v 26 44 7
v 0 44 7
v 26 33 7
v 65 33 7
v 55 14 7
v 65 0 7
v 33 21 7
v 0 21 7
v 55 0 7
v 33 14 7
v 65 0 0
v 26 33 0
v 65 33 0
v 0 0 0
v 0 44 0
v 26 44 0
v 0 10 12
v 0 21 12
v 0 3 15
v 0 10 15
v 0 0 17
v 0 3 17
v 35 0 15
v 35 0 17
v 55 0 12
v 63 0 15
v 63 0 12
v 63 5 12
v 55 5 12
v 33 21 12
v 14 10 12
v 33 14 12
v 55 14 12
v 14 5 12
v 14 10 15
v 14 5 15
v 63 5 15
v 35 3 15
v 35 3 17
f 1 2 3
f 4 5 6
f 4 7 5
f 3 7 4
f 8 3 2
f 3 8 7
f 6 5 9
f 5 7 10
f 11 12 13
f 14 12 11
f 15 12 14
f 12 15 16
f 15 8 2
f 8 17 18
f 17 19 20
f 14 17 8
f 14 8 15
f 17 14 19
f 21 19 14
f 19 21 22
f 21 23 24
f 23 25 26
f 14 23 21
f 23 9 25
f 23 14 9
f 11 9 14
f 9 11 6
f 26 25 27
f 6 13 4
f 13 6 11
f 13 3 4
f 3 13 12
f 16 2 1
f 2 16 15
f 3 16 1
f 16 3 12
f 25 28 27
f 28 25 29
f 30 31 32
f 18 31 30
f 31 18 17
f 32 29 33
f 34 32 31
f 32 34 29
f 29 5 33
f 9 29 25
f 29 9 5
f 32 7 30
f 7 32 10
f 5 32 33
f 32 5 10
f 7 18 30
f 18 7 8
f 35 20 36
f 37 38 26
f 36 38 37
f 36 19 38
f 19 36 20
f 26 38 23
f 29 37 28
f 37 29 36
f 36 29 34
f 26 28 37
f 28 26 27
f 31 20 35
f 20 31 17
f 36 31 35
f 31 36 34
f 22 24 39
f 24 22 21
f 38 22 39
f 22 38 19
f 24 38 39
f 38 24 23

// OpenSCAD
translate([6.5, 5.5, 3.5]) color([0.31617713722134233, 0.2135246620646961, 0.7173241433110372]) cube([13, 11, 7], center=true);
translate([19.5, 5.5, 3.5]) color([0.0023575647193538884, 0.8227314105314157, 0.5283459768597928]) cube([13, 11, 7], center=true);
translate([32.5, 5.5, 3.5]) color([0.09778434180065931, 0.11890389478474583, 0.6492654248961536]) cube([13, 11, 7], center=true);
translate([45.5, 5.5, 3.5]) color([0.8736538239003423, 0.27998274332687256, 0.9785151867733981]) cube([13, 11, 7], center=true);
translate([58.5, 5.5, 3.5]) color([0.10018068906370903, 0.8539381095973382, 0.39669617733090445]) cube([13, 11, 7], center=true);
translate([6.5, 16.5, 3.5]) color([0.08134541676823415, 0.2747138434192621, 0.4529781848179143]) cube([13, 11, 7], center=true);
translate([19.5, 16.5, 3.5]) color([0.7923415311856522, 0.8613599036372361, 0.13342055420254906]) cube([13, 11, 7], center=true);
translate([32.5, 16.5, 3.5]) color([0.5208655284141989, 0.6507832381497373, 0.3470530145996015]) cube([13, 11, 7], center=true);
translate([45.5, 16.5, 3.5]) color([0.8718638357105861, 0.27840981521636055, 0.01857432754559518]) cube([13, 11, 7], center=true);
translate([58.5, 16.5, 3.5]) color([0.0406632736752609, 0.6809967701112433, 0.5583557360970469]) cube([13, 11, 7], center=true);
translate([6.5, 27.5, 3.5]) color([0.946502554169996, 0.9384387997349186, 0.9098511774051025]) cube([13, 11, 7], center=true);
translate([19.5, 27.5, 3.5]) color([0.04200453196734122, 0.7491348233908631, 0.7013248175948597]) cube([13, 11, 7], center=true);
translate([32.5, 27.5, 3.5]) color([0.6553618646747296, 0.7123576525162417, 0.9027101506193307]) cube([13, 11, 7], center=true);
translate([45.5, 27.5, 3.5]) color([0.6401411997932241, 0.372449262972256, 0.5379287837318205]) cube([13, 11, 7], center=true);
translate([58.5, 27.5, 3.5]) color([0.20784410369082473, 0.5871255046951435, 0.008897082049078797]) cube([13, 11, 7], center=true);
translate([6.5, 38.5, 3.5]) color([0.15102317386398778, 0.3334083880298664, 0.7896231589257826]) cube([13, 11, 7], center=true);
translate([19.5, 38.5, 3.5]) color([0.7184994227715396, 0.3382559700266786, 0.6205381083165517]) cube([13, 11, 7], center=true);
translate([5.5, 3.5, 9.5]) color([0.041202949506209285, 0.16386054567557595, 0.9819140701253054]) cube([11, 7, 5], center=true);
translate([16.5, 3.5, 9.5]) color([0.28953085363586695, 0.39479198298829066, 0.5484842965725134]) cube([11, 7, 5], center=true);
translate([27.5, 3.5, 9.5]) color([0.29340700145733656, 0.47806466915102097, 0.2397060836386239]) cube([11, 7, 5], center=true);
translate([38.5, 3.5, 9.5]) color([0.04825636228829444, 0.17958684904155564, 0.5230502317000981]) cube([11, 7, 5], center=true);
translate([49.5, 3.5, 9.5]) color([0.07086288409434749, 0.4031691464450935, 0.3285207100154869]) cube([11, 7, 5], center=true);
translate([5.5, 10.5, 9.5]) color([0.4147216089714424, 0.09940033823870109, 0.9086575543967805]) cube([11, 7, 5], center=true);
translate([16.5, 10.5, 9.5]) color([0.4740046511372964, 0.8408483326276716, 0.976229457649057]) cube([11, 7, 5], center=true);
translate([27.5, 10.5, 9.5]) color([0.34365159365776776, 0.4790865191519861, 0.6995952911506185]) cube([11, 7, 5], center=true);
translate([38.5, 10.5, 9.5]) color([0.42653532354402823, 0.30190311621935595, 0.7347509912186152]) cube([11, 7, 5], center=true);
translate([49.5, 10.5, 9.5]) color([0.8943997782145745, 0.9196888444316101, 0.6267420468068673]) cube([11, 7, 5], center=true);
translate([5.5, 17.5, 9.5]) color([0.3755713463285453, 0.9745605214796941, 0.6388785175004733]) cube([11, 7, 5], center=true);
translate([16.5, 17.5, 9.5]) color([0.06583467727730097, 0.08466956912011114, 0.749869571783086]) cube([11, 7, 5], center=true);
translate([27.5, 17.5, 9.5]) color([0.06115615654596607, 0.007851005331251826, 0.39380795178170946]) cube([11, 7, 5], center=true);
translate([3.5, 2.5, 13.5]) color([0.5190037287013293, 0.44854428559655457, 0.48861880442715255]) cube([7, 5, 3], center=true);
translate([10.5, 2.5, 13.5]) color([0.5848887019932744, 0.6793025673721249, 0.4230380735074225]) cube([7, 5, 3], center=true);
translate([17.5, 2.5, 13.5]) color([0.3683314563344259, 0.9884590580992895, 0.26091653544625626]) cube([7, 5, 3], center=true);
translate([24.5, 2.5, 13.5]) color([0.7771001545085096, 0.43122102463204415, 0.35852038200953895]) cube([7, 5, 3], center=true);
translate([31.5, 2.5, 13.5]) color([0.06385794894382868, 0.8635789443020424, 0.7020041497619371]) cube([7, 5, 3], center=true);
translate([38.5, 2.5, 13.5]) color([0.9030107075409272, 0.4516117926868677, 0.6769209668166035]) cube([7, 5, 3], center=true);
translate([45.5, 2.5, 13.5]) color([0.11891028655385572, 0.3979536016023134, 0.20723197341708288]) cube([7, 5, 3], center=true);
translate([52.5, 2.5, 13.5]) color([0.04210142789066196, 0.94796135125632, 0.21589436846535714]) cube([7, 5, 3], center=true);
translate([59.5, 2.5, 13.5]) color([0.1463544898080057, 0.19797004355794223, 0.37803196431429753]) cube([7, 5, 3], center=true);
translate([3.5, 7.5, 13.5]) color([0.5463912623151137, 0.15133436847289106, 0.9886898889857565]) cube([7, 5, 3], center=true);
translate([10.5, 7.5, 13.5]) color([0.9829892105452821, 0.14840201708602985, 0.4059068831679489]) cube([7, 5, 3], center=true);
translate([2.5, 1.5, 16.0]) color([0.6799294831100022, 0.8776565829010952, 0.49540592491118873]) cube([5, 3, 2], center=true);
translate([7.5, 1.5, 16.0]) color([0.9170466727598151, 0.3224603148813061, 0.4984408914907503]) cube([5, 3, 2], center=true);
translate([12.5, 1.5, 16.0]) color([0.4986465918650089, 0.6700681513152942, 0.2019913087994536]) cube([5, 3, 2], center=true);
translate([17.5, 1.5, 16.0]) color([0.6097706104167804, 0.21877309687215574, 0.340220315051032]) cube([5, 3, 2], center=true);
translate([22.5, 1.5, 16.0]) color([0.9625664632546818, 0.8990080380310076, 0.8181183809177941]) cube([5, 3, 2], center=true);
translate([27.5, 1.5, 16.0]) color([0.035468261876012264, 0.14836688246192975, 0.2568819120719038]) cube([5, 3, 2], center=true);
translate([32.5, 1.5, 16.0]) color([0.7841665681891542, 0.8423333270773672, 0.5829481802462215]) cube([5, 3, 2], center=true);
